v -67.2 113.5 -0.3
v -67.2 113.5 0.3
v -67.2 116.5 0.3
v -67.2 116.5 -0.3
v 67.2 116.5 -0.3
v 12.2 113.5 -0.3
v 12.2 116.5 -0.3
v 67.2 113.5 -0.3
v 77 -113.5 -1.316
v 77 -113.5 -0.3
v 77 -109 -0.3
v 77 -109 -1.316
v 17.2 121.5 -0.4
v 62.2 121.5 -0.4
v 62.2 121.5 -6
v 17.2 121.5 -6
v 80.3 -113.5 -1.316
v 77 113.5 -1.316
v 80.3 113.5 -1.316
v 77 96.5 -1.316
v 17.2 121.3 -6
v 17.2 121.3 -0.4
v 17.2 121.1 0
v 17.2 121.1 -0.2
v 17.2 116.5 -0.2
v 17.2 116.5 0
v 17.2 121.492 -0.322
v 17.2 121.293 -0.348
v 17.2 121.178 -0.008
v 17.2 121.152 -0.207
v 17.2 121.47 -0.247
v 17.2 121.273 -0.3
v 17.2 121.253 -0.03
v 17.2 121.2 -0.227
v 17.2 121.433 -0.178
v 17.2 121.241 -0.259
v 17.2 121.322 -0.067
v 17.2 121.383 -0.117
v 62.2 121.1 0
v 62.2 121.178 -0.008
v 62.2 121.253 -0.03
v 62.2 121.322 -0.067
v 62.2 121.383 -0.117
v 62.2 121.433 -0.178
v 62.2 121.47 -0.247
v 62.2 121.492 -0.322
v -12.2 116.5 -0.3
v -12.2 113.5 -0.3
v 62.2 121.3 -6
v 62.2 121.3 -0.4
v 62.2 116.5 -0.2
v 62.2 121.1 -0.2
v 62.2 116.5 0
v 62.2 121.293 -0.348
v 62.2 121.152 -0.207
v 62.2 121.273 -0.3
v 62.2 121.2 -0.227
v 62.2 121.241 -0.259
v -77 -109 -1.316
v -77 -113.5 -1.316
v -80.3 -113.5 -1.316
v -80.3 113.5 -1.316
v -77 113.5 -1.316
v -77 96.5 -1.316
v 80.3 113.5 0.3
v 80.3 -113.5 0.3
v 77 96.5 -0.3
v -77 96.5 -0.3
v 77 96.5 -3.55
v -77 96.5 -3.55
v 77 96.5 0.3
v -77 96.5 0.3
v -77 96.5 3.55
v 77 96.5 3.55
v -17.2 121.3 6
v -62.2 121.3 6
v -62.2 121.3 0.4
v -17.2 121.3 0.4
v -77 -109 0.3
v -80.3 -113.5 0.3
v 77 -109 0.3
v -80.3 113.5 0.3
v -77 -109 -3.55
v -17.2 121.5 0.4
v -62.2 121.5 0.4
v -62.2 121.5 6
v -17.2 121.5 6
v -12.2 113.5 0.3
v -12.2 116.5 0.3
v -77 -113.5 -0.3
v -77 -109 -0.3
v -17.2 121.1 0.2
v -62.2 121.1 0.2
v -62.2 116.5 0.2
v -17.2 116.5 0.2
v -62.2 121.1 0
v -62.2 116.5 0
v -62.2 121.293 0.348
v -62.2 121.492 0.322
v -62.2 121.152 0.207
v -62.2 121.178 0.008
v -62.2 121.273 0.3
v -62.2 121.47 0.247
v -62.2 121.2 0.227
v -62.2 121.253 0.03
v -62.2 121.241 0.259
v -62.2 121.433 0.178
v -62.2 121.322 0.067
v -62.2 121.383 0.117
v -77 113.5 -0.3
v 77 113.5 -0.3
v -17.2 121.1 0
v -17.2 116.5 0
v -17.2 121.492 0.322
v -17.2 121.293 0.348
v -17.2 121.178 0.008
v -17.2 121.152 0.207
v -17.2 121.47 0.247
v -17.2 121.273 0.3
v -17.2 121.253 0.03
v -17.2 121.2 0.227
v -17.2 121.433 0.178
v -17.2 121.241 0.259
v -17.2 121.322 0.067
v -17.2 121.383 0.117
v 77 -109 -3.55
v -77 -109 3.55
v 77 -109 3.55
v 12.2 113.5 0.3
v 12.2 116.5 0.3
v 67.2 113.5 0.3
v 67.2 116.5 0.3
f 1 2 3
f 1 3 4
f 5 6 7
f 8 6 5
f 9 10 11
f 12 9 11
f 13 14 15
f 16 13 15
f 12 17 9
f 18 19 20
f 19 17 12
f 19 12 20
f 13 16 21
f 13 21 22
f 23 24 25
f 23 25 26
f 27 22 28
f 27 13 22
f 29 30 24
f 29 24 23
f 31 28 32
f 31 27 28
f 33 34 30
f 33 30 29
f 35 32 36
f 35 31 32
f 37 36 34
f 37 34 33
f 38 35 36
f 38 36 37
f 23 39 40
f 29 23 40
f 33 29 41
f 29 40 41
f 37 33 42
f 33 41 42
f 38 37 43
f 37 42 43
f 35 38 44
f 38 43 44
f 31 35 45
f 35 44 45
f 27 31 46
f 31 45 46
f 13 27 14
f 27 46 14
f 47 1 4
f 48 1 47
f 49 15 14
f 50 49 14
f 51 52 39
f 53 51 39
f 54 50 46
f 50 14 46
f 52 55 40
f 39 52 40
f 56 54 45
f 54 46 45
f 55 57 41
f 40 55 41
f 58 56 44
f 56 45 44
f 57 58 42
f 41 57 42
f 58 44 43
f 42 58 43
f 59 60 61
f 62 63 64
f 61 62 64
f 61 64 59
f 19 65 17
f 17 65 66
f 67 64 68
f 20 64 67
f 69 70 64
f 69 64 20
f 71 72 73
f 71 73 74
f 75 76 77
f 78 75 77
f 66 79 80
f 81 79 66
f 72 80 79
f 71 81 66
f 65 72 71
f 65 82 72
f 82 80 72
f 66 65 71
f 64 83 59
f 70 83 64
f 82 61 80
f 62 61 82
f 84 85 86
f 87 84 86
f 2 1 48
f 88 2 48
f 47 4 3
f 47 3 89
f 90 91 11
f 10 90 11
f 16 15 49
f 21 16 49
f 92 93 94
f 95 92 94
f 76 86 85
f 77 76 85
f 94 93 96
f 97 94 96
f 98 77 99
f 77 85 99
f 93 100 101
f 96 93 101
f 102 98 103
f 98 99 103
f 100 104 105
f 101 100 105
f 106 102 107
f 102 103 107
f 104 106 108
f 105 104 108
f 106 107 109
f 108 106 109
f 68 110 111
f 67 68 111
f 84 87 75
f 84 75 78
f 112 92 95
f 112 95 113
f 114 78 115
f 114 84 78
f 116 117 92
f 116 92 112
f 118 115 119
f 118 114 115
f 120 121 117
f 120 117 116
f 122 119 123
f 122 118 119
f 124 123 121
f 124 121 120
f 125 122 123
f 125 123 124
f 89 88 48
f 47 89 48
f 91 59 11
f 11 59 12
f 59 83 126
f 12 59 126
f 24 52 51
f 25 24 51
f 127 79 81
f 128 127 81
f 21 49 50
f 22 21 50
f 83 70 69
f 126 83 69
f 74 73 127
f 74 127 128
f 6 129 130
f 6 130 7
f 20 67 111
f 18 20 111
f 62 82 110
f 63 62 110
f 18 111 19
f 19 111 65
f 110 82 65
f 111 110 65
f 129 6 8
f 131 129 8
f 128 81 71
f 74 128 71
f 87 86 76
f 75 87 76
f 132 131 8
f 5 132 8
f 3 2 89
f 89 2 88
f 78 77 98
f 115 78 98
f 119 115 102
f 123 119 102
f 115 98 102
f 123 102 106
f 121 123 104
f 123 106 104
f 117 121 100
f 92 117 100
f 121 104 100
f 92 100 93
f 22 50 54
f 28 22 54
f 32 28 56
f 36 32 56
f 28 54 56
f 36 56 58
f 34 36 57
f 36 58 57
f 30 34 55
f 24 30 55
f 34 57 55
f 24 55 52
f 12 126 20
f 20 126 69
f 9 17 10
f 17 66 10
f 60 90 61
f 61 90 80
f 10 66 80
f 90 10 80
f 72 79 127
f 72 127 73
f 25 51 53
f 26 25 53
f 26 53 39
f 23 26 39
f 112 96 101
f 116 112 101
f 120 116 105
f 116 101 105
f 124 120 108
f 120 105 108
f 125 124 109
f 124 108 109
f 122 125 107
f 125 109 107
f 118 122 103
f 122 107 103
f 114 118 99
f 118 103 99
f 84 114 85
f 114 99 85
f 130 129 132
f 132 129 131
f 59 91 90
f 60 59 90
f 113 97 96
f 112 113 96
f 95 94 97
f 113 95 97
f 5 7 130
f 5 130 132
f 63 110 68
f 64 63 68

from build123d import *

# Parameters (mm, degrees)
INSULATION_DEPTH      = 0.3
INSULATION_DEPTH_BACK = 0.3
SKETCH1_W             = 160.6
SKETCH1_H             = 227
MAIN_BODY_DEPTH       = 3.55
MAIN_BODY_DEPTH_BACK  = 3.55
SKETCH2_W             = 154
SKETCH2_H             = 205.5
SIDE_FOLDS_DEPTH      = 1.016
SKETCH114_W           = 55
SKETCH114_H           = 0.6
BOSS_EXTRUDE1_DEPTH   = 3
BOSS_EXTRUDE1_2_DEPTH = 3
BASE_FLANGE1_DEPTH    = 45
BASE_FLANGE2_DEPTH    = 45


# Sheet-metal steps are written as plain solids
with BuildPart() as part:
    # Sketch1 → Insulation (new, two sides: drawn at the far end of the back side and taken through both)
    with BuildSketch(Plane.XY.offset(-INSULATION_DEPTH_BACK)):
        Rectangle(SKETCH1_W, SKETCH1_H)
    extrude(amount=INSULATION_DEPTH + INSULATION_DEPTH_BACK)

    # Sketch2 → Main Body (add, two sides: drawn at the far end of the back side and taken through both)
    with BuildSketch(Plane.XY.offset(-MAIN_BODY_DEPTH_BACK)):
        with Locations((0, -6.25)):
            Rectangle(SKETCH2_W, SKETCH2_H)
    extrude(amount=MAIN_BODY_DEPTH + MAIN_BODY_DEPTH_BACK)

    # Sketch5 → Side Folds (add)
    with BuildSketch(Plane(origin=(0, 0, -0.3), x_dir=(-1, 0, 0), z_dir=(0, 0, -1))):
        Polygon((-77, -109), (-77, 96.5), (-77, 113.5), (-80.3, 113.5), (-80.3, -113.5), (-77, -113.5), align=None)
        Polygon((77, 113.5), (77, 96.5), (77, -109), (77, -113.5), (80.3, -113.5), (80.3, 113.5), align=None)
    extrude(amount=SIDE_FOLDS_DEPTH)


with BuildPart() as body_2:
    # Sketch114 → Boss-Extrude1 (new body)
    with BuildSketch(Plane(origin=(0, 113.5, 0), x_dir=(1, 0, 0), z_dir=(0, 1, 0))):
        with Locations((-39.7, 0)):
            Rectangle(SKETCH114_W, SKETCH114_H)
    extrude(amount=BOSS_EXTRUDE1_DEPTH)


with BuildPart() as body_3:
    # Sketch114 → Boss-Extrude1 2 (new body)
    with BuildSketch(Plane(origin=(0, 113.5, 0), x_dir=(1, 0, 0), z_dir=(0, 1, 0))):
        with Locations((39.7, 0)):
            Rectangle(SKETCH114_W, SKETCH114_H)
    extrude(amount=BOSS_EXTRUDE1_2_DEPTH)


with BuildPart() as body_4:
    # Sketch115 → Base-Flange1 (new body)
    with BuildSketch(Plane.ZY.offset(62.2)):
        with BuildLine():
            Line((0, 116.5), (0, 121.1))
            ThreePointArc((0, 121.1), (0.117157288, 121.382842712), (0.4, 121.5))
            Line((0.4, 121.5), (6, 121.5))
            Line((6, 121.5), (6, 121.3))
            Line((6, 121.3), (0.4, 121.3))
            ThreePointArc((0.4, 121.3), (0.258578644, 121.241421356), (0.2, 121.1))
            Line((0.2, 121.1), (0.2, 116.5))
            Line((0.2, 116.5), (0, 116.5))
        make_face()
    extrude(amount=-BASE_FLANGE1_DEPTH)


with BuildPart() as body_5:
    # Sketch120 → Base-Flange2 (new body)
    with BuildSketch(Plane(origin=(62.2, 0, 0), x_dir=(0, 0, -1), z_dir=(1, 0, 0))):
        with BuildLine():
            Line((0, 116.5), (0, 121.1))
            ThreePointArc((0, 121.1), (0.117157288, 121.382842712), (0.4, 121.5))
            Line((0.4, 121.5), (6, 121.5))
            Line((6, 121.5), (6, 121.3))
            Line((6, 121.3), (0.4, 121.3))
            ThreePointArc((0.4, 121.3), (0.258578644, 121.241421356), (0.2, 121.1))
            Line((0.2, 121.1), (0.2, 116.5))
            Line((0.2, 116.5), (0, 116.5))
        make_face()
    extrude(amount=-BASE_FLANGE2_DEPTH)


solid = Compound([part.part, body_2.part, body_3.part, body_4.part, body_5.part])
